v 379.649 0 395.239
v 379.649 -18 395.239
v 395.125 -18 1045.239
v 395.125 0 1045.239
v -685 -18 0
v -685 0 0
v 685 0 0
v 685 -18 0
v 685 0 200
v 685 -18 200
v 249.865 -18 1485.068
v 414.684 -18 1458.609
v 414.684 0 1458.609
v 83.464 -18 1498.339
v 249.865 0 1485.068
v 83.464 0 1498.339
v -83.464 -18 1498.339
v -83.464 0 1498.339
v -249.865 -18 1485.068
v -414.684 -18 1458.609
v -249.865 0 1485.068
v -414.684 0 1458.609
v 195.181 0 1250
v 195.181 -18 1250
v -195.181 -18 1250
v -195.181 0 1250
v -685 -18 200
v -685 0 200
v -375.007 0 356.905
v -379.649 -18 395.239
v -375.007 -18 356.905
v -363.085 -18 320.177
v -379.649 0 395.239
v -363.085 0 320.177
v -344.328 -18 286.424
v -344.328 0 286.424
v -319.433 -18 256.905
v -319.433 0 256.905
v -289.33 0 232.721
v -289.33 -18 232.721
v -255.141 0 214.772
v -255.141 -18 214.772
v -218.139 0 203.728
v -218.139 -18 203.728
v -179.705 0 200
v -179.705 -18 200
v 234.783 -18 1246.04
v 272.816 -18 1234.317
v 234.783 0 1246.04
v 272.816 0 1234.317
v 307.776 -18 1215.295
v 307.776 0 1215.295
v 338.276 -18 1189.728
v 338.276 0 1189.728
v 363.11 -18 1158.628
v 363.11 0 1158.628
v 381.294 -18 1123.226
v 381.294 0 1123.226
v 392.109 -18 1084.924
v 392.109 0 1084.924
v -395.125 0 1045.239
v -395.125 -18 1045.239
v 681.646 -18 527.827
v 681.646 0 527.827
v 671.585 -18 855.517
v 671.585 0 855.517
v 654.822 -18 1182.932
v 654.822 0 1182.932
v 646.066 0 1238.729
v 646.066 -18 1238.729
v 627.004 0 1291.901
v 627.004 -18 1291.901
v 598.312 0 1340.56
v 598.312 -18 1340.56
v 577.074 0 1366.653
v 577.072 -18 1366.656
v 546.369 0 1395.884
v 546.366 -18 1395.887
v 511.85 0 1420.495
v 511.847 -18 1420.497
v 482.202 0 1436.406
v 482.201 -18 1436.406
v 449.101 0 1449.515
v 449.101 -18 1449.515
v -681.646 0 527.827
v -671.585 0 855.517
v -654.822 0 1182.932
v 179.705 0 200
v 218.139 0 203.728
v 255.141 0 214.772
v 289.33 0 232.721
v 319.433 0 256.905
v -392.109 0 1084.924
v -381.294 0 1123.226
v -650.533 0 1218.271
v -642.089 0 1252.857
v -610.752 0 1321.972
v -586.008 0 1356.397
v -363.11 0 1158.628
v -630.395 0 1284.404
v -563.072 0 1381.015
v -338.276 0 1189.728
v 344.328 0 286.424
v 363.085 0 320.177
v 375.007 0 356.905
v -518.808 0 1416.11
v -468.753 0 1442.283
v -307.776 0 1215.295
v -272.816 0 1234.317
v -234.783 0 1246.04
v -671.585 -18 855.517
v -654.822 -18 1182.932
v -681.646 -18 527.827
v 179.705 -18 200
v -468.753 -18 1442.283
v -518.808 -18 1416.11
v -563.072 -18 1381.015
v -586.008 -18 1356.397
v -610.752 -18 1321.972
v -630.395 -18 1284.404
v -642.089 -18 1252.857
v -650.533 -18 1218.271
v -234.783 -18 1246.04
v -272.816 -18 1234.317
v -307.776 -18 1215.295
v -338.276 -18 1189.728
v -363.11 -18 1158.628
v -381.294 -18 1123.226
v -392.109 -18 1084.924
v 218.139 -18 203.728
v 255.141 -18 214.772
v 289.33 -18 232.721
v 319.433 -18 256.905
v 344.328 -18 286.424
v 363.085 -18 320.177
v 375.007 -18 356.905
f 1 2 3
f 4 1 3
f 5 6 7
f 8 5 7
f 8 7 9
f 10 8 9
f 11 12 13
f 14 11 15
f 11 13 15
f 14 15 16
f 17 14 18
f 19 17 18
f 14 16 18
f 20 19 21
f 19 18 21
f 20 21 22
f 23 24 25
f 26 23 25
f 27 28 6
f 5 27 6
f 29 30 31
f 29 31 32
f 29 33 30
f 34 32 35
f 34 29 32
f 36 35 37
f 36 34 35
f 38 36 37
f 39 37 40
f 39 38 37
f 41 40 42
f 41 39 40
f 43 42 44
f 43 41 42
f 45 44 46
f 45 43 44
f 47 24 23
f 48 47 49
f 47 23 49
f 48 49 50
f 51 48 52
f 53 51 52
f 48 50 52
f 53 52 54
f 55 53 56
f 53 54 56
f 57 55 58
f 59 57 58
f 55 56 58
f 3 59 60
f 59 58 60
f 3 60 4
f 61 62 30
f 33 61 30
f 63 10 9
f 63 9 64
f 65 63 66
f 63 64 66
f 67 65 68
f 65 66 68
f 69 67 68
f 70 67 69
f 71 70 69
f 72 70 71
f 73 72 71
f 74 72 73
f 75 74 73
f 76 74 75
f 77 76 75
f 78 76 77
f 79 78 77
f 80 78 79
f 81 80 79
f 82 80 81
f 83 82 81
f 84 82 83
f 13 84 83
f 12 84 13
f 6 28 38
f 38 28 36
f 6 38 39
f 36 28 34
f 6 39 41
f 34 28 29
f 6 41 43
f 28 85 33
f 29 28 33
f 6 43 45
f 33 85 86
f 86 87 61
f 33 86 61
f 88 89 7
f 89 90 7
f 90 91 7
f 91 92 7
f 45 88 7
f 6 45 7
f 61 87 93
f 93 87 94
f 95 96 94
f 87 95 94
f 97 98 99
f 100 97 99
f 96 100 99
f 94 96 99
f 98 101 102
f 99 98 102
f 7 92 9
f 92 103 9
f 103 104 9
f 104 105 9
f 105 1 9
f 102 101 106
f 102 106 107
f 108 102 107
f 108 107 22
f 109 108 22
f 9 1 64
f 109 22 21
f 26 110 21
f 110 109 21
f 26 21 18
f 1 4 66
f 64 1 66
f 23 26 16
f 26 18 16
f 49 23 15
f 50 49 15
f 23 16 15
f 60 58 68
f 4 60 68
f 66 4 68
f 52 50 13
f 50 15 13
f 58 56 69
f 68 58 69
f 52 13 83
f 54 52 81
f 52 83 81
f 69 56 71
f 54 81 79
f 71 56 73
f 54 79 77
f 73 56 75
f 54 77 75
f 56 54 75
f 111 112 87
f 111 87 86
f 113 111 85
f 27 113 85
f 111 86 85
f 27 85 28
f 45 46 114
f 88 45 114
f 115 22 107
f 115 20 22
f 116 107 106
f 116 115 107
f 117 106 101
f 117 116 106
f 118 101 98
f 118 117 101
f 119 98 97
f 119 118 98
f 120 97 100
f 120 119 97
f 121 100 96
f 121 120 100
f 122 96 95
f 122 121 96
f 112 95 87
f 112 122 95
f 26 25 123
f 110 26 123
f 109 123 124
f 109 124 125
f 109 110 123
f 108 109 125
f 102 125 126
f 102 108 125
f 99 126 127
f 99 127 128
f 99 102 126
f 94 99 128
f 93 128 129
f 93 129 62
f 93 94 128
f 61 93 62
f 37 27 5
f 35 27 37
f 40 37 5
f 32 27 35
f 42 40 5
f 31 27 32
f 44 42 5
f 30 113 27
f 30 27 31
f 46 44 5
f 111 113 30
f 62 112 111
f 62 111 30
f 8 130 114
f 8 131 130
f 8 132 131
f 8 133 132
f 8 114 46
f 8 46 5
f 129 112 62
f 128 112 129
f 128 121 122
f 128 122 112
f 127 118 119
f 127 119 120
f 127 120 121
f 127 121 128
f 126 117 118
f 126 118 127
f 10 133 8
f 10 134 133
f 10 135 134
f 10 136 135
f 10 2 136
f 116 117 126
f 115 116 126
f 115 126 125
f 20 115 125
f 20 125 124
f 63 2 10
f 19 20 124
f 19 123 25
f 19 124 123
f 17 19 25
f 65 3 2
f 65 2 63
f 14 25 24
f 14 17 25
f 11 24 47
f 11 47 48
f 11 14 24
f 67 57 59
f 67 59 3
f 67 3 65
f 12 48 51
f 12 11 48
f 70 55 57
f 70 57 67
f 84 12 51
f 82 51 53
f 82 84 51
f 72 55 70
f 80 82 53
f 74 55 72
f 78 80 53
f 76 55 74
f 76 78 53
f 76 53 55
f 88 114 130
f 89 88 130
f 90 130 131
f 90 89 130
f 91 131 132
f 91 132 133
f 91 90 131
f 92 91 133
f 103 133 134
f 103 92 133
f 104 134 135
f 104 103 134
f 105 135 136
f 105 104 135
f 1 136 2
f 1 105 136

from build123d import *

# Parameters (mm, degrees)
F1_DEPTH = 18
F2_R     = 300
F4_DEPTH = 25
F5_R     = 200


with BuildPart() as f1:
    # F0 (on Front) → F1 (new body)
    with BuildSketch(Plane.XZ):
        with BuildLine():
            Line((-685, 200), (-685, 0))
            Line((-685, 0), (685, 0))
            Line((685, 0), (685, 200))
            ThreePointArc((685, 200), (673.746048, 800.421727), (640, 1400))
            ThreePointArc((640, 1400), (0, 1500), (-640, 1400))
            ThreePointArc((-640, 1400), (-673.746048, 800.421727), (-685, 200))
        make_face()
    extrude(amount=F1_DEPTH)

    # F2
    f2_edges = [f1.edges().sort_by_distance(p)[0] for p in [
        (-640, -9, 1400),
        (640, -9, 1400),
    ]]
    fillet(f2_edges, radius=F2_R)

    # F3 (on face) → F4 (cut)
    with BuildSketch(Plane.XZ.offset(18)):
        Polygon((400, 1250), (-400, 1250), (-375, 200), (375, 200), align=None)
    extrude(amount=-F4_DEPTH, mode=Mode.SUBTRACT)

    # F5
    f5_edges = [f1.edges().sort_by_distance(p)[0] for p in [
        (400, -9, 1250),
        (-400, -9, 1250),
        (-375, -9, 200),
        (375, -9, 200),
    ]]
    fillet(f5_edges, radius=F5_R)


solid = f1.part
